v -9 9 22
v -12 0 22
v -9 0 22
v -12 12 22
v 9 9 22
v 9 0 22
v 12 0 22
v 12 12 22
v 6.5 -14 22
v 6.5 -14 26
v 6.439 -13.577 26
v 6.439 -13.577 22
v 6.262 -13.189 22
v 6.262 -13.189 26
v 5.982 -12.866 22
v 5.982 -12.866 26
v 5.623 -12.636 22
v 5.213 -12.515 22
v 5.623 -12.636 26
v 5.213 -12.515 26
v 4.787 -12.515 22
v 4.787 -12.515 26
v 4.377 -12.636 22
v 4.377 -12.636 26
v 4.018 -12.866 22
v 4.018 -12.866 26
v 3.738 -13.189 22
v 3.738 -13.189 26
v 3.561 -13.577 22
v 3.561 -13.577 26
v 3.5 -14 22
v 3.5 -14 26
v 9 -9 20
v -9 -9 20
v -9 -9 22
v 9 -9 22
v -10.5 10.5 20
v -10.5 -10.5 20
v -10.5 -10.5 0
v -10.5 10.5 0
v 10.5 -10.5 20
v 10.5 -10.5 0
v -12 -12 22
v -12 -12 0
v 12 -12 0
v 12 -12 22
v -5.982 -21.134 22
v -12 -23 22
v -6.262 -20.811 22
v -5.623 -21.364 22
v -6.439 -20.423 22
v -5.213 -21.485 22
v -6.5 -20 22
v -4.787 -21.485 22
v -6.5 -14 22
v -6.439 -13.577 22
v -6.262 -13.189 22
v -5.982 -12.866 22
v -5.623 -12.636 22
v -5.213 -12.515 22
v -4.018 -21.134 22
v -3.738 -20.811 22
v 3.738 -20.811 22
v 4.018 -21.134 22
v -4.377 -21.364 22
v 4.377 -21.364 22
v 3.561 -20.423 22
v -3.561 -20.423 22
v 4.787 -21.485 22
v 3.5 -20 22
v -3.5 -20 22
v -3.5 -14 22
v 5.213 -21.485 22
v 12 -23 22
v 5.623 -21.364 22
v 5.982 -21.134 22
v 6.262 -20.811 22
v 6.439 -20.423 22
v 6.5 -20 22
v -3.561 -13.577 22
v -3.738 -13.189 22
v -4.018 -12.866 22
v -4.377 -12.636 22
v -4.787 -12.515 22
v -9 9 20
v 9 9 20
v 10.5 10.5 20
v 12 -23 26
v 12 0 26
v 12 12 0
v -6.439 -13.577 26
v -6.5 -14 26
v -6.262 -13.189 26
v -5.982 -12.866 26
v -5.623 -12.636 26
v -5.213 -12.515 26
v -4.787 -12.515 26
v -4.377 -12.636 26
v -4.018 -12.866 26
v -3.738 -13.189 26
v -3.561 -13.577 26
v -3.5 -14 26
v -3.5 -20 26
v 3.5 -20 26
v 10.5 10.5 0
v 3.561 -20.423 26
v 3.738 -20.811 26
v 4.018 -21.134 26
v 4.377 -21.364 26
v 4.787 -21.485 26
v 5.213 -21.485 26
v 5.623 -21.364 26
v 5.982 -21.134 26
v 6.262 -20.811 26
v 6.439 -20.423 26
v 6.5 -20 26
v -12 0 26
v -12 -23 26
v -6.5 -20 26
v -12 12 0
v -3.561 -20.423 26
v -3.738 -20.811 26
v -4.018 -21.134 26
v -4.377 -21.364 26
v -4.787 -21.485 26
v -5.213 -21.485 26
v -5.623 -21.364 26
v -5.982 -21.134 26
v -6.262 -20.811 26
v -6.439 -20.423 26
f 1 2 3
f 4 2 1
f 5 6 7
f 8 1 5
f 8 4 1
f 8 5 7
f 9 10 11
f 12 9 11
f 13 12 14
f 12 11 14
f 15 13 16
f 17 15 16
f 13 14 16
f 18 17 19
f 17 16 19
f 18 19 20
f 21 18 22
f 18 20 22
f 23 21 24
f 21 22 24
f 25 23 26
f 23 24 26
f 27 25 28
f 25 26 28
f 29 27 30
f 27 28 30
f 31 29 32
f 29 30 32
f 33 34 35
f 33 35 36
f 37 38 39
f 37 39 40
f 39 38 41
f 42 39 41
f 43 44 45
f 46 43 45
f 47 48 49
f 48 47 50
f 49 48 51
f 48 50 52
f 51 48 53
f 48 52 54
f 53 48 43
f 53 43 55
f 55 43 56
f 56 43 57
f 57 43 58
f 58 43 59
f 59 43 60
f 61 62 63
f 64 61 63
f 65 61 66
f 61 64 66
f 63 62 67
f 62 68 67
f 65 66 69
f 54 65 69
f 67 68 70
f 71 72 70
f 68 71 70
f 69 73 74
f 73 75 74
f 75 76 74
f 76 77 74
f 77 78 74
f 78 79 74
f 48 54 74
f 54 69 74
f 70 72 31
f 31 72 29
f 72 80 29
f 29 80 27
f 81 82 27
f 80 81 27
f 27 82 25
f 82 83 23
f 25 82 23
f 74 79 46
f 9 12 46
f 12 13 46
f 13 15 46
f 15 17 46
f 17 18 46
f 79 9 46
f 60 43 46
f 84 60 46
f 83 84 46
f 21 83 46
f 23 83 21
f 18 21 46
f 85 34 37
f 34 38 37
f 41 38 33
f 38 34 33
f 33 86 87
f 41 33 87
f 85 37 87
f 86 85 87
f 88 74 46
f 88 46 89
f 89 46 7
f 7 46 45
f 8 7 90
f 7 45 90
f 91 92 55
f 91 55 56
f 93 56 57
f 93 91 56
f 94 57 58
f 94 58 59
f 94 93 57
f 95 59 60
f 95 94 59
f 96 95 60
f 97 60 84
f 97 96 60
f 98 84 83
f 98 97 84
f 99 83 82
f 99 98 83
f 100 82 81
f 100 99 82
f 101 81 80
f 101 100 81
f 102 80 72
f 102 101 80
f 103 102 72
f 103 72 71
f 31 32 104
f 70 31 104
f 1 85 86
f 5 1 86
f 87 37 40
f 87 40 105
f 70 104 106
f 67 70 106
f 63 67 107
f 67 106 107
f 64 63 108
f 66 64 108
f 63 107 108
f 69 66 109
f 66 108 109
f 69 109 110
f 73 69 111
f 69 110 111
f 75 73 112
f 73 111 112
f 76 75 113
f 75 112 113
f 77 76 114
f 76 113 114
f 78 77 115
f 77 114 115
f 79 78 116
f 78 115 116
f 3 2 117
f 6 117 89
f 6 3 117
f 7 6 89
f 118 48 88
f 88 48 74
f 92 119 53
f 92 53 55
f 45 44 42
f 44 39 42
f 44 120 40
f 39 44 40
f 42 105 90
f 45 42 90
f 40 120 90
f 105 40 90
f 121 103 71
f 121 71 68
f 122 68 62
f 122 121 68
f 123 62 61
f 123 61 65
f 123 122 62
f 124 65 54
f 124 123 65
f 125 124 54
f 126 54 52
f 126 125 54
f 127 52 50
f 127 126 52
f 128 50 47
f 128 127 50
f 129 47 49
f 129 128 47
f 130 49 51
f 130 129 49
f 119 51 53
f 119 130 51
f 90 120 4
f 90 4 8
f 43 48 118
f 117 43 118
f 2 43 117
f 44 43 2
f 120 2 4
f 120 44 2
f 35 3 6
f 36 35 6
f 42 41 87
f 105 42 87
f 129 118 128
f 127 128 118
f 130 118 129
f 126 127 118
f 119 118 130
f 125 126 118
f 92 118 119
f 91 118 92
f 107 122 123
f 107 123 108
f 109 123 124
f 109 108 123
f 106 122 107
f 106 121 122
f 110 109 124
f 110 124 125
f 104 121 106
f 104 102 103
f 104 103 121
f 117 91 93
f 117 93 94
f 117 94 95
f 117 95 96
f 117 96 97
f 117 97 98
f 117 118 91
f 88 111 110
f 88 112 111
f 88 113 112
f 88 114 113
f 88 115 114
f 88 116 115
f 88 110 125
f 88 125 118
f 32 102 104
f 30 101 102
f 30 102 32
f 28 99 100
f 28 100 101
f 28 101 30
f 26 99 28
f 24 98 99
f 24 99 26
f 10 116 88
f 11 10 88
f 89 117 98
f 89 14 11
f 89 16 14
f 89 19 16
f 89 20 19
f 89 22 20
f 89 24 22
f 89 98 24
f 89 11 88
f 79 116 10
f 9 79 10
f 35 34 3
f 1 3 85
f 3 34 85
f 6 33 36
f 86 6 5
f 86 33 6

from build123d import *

# Parameters (mm, degrees)
SKETCH_1_W          = 24
SKETCH_1_H          = 24
EXTRUDE_2_DEPTH     = 20
SKETCH_3_W          = 21
SKETCH_3_H          = 21
CUT_EXTRUDE_1_DEPTH = 20
SKETCH_4_W          = 24
SKETCH_4_H          = 3
EXTRUDE_8_DEPTH     = 2
SKETCH_8_W          = 3
SKETCH_8_H          = 21
EXTRUDE_9_DEPTH     = 2
SKETCH_9_W          = 21
SKETCH_9_H          = 3
EXTRUDE_10_DEPTH    = 2
SKETCH_10_W         = 3
SKETCH_10_H         = 18
EXTRUDE_11_DEPTH    = 2
SKETCH_11_W         = 24
SKETCH_11_H         = 23
EXTRUDE_12_DEPTH    = 4
CUT_EXTRUDE_2_DEPTH = 4


with BuildPart() as part:
    # 草图1 → 凸台-拉伸2 (new body)
    with BuildSketch(Plane.XY):
        Rectangle(SKETCH_1_W, SKETCH_1_H)
    extrude(amount=EXTRUDE_2_DEPTH)

    # 草图3 → 切除-拉伸1 (cut)
    with BuildSketch(Plane.XY.offset(20)):
        Rectangle(SKETCH_3_W, SKETCH_3_H)
    extrude(amount=-CUT_EXTRUDE_1_DEPTH, mode=Mode.SUBTRACT)

    # 草图4 → 凸台-拉伸8 (add)
    with BuildSketch(Plane.XY.offset(20)):
        with Locations((0, 10.5)):
            Rectangle(SKETCH_4_W, SKETCH_4_H)
    extrude(amount=EXTRUDE_8_DEPTH)

    # 草图8 → 凸台-拉伸9 (add)
    with BuildSketch(Plane.XY.offset(20)):
        with Locations((-10.5, -1.5)):
            Rectangle(SKETCH_8_W, SKETCH_8_H)
    extrude(amount=EXTRUDE_9_DEPTH)

    # 草图9 → 凸台-拉伸10 (add)
    with BuildSketch(Plane.XY.offset(20)):
        with Locations((1.5, -10.5)):
            Rectangle(SKETCH_9_W, SKETCH_9_H)
    extrude(amount=EXTRUDE_10_DEPTH)

    # 草图10 → 凸台-拉伸11 (add)
    with BuildSketch(Plane.XY.offset(20)):
        with Locations((10.5, 0)):
            Rectangle(SKETCH_10_W, SKETCH_10_H)
    extrude(amount=EXTRUDE_11_DEPTH)

    # 草图11 → 凸台-拉伸12 (add)
    with BuildSketch(Plane.XY.offset(22)):
        with Locations((0, -11.5)):
            Rectangle(SKETCH_11_W, SKETCH_11_H)
    extrude(amount=EXTRUDE_12_DEPTH)

    # 草图12 → 切除-拉伸2 (cut)
    with BuildSketch(Plane.XY.offset(26)):
        with BuildLine():
            Line((-3.5, -14), (-3.5, -20))
            ThreePointArc((-3.5, -20), (-5, -21.5), (-6.5, -20))
            Line((-6.5, -20), (-6.5, -14))
            ThreePointArc((-6.5, -14), (-5, -12.5), (-3.5, -14))
        make_face()
        with BuildLine():
            Line((3.5, -14), (3.5, -20))
            ThreePointArc((3.5, -20), (5, -21.5), (6.5, -20))
            Line((6.5, -20), (6.5, -14))
            ThreePointArc((6.5, -14), (5, -12.5), (3.5, -14))
        make_face()
    extrude(amount=-CUT_EXTRUDE_2_DEPTH, mode=Mode.SUBTRACT)


solid = part.part
